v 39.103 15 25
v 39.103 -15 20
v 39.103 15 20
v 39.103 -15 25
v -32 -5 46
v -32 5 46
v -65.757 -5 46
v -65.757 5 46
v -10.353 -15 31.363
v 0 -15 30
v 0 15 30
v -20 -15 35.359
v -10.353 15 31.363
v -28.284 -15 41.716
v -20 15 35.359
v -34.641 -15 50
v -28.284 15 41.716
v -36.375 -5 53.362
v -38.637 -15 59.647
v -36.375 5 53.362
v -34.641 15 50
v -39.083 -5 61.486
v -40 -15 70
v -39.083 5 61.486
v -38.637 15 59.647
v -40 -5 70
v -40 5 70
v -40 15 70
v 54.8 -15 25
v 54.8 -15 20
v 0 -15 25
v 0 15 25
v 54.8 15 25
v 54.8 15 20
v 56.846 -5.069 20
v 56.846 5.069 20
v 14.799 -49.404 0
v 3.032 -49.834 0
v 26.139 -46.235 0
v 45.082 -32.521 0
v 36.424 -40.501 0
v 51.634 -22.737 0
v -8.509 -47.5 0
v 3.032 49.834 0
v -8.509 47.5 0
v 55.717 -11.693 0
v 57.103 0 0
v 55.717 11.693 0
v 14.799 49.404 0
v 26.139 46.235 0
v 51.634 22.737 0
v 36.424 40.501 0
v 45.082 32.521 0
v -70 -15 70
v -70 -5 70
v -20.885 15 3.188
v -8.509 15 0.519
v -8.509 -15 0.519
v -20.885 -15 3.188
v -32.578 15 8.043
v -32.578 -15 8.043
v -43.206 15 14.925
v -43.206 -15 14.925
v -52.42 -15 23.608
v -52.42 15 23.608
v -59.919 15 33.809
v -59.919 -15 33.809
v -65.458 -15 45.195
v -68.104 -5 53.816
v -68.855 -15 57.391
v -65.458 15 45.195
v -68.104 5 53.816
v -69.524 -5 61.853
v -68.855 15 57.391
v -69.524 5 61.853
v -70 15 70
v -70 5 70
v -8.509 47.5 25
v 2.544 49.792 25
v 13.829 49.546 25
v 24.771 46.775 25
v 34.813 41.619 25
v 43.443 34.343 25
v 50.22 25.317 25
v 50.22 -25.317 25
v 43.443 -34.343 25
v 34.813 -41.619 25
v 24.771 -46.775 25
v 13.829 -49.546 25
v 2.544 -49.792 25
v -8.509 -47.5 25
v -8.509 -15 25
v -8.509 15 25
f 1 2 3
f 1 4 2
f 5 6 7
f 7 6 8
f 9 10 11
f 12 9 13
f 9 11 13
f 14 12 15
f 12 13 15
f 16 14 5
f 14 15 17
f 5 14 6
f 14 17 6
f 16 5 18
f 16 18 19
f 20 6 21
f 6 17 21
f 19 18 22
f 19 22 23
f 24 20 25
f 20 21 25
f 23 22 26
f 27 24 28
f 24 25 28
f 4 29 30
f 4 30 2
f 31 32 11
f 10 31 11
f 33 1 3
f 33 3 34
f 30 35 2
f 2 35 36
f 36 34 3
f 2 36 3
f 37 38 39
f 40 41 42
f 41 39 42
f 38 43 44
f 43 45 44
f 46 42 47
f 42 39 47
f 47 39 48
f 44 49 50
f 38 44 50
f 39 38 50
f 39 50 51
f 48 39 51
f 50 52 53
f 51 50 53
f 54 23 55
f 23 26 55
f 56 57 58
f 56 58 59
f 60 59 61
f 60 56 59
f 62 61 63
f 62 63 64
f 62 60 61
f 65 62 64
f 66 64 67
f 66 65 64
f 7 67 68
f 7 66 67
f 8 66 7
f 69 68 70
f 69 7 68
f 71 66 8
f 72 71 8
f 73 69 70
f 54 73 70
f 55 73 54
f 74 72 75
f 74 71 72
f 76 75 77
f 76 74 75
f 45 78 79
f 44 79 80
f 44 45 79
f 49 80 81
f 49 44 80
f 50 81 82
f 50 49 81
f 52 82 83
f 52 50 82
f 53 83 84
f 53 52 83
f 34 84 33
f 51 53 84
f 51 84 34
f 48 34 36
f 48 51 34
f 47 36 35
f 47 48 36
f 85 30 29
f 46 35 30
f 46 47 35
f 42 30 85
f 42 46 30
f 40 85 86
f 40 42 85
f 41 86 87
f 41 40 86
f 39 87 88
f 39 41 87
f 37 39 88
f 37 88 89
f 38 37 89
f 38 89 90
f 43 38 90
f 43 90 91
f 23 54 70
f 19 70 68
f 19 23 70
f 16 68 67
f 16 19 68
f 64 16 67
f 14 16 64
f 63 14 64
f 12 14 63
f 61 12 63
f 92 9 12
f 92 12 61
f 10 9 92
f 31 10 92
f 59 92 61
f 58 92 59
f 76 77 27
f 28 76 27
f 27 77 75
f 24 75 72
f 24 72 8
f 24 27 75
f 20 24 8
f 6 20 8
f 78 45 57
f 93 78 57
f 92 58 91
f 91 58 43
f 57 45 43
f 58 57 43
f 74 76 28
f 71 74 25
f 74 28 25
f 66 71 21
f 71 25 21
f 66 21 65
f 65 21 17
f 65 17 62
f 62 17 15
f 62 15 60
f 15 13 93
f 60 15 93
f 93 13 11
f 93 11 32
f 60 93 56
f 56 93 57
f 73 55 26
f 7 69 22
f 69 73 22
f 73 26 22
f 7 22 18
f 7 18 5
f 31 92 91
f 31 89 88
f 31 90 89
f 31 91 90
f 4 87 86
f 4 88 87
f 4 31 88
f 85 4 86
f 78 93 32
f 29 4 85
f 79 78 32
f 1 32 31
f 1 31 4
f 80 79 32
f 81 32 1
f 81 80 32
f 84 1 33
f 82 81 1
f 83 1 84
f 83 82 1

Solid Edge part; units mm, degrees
sketch "Sketch1" plane through (0, 0, 0) normal (0, -1, 0) x (1, 0, 0)
  line L0 (-32, 46) -> (-65.7571, 46)
  line L1 (0, 0) -> (0, 30)
  arc A0 (0, 30) -> (-32, 46) centre (0, 70) cw
  arc A1 (0, 0) -> (-65.7571, 46) centre (0, 70) cw
extrude "Protrusion1" add sketch "Sketch1" along normal mid plane 10
sketch "Sketch2" plane through (-32.8786, -5, 23) normal (0, -1, 0) x (1, 0, 0)
  line L0 (-7.1214, 47) -> (-37.1214, 47)
  line L1 (32.8786, -23) -> (32.8786, 7)
  arc A0 (32.8786, 7) -> (-7.1214, 47) centre (32.8786, 47) cw
  arc A1 (32.8786, -23) -> (-37.1214, 47) centre (32.8786, 47) cw
extrude "ExtrudedProtrusion_2" add sketch "Sketch2" along normal blind 10
sketch "Sketch3" plane through (-32.8786, 5, 23) normal (0, 1, 0) x (-1, 0, 0)
  line L0 (-32.8786, -23) -> (-32.8786, 7)
  line L1 (37.1214, 47) -> (7.1214, 47)
  arc A0 (37.1214, 47) -> (-32.8786, -23) centre (-32.8786, 47) cw
  arc A1 (7.1214, 47) -> (-32.8786, 7) centre (-32.8786, 47) cw
extrude "ExtrudedProtrusion_3" add sketch "Sketch3" along normal blind 10
sketch "Sketch4" plane through (0, 0, 0) normal (0, 0, 1) x (1, 0, 0)
  line L0 (-8.5091, 47.5) -> (-8.5091, -47.5)
  arc A0 (-8.5091, 47.5) -> (-8.5091, -47.5) centre (7.1034, 0) cw
extrude "ExtrudedProtrusion_4" add sketch "Sketch4" along normal blind 25
sketch "Sketch5" plane through (24.2972, 0, 25) normal (0, 0, 1) x (0, 1, 0)
  line L0 (0, -14.8062) -> (15, -14.8062)
  line L1 (15, -14.8062) -> (15, -32.8062)
  line L2 (15, -32.8062) -> (-15, -32.8062)
  line L3 (-15, -32.8062) -> (-15, -14.8062)
  line L4 (-15, -14.8062) -> (0, -14.8062)
extrude "ExtrudedCutout_2" cut sketch "Sketch5" against normal blind 5
